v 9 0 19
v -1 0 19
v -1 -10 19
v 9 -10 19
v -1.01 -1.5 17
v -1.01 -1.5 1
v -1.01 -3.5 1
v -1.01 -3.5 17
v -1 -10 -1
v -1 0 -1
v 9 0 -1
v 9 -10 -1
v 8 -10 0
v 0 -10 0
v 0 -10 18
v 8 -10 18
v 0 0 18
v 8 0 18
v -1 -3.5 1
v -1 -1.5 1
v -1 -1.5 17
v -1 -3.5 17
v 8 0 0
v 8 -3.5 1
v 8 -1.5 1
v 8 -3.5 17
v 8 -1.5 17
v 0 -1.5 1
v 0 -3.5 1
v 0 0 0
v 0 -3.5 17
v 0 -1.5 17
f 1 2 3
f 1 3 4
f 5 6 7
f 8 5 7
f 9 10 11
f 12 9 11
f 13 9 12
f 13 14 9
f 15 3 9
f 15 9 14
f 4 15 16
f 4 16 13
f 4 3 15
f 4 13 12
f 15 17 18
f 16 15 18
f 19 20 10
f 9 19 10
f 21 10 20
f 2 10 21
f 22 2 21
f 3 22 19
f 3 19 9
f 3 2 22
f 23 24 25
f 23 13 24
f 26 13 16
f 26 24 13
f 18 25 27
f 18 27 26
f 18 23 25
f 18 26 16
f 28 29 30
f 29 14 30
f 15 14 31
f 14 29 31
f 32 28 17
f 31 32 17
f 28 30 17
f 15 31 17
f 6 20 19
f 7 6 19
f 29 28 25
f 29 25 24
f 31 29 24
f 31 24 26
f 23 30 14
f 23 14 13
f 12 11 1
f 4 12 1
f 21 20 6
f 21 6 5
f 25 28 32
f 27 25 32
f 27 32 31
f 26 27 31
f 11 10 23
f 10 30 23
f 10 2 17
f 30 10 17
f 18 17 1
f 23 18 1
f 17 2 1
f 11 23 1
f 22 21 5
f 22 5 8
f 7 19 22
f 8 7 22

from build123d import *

# Parameters (mm, degrees)
F0_W          = 10
F0_H          = 20
F0_W_2        = 8
F0_H_2        = 18
F1_DEPTH      = 10
F2_W          = 2
F2_H          = 16
F3_DEPTH      = 10
F3_DEPTH_BACK = 0.01


with BuildPart() as f1:
    # F0 (on Front) → F1 (new body)
    with BuildSketch(Plane.XZ):
        with Locations((4, 9)):
            Rectangle(F0_W, F0_H)
        with Locations((4, 9)):
            Rectangle(F0_W_2, F0_H_2, mode=Mode.SUBTRACT)
    extrude(amount=F1_DEPTH)

    # F2 (on face) → F3 (join, two sides)
    with BuildSketch(Plane(origin=(-1, 0, 0), x_dir=(0, -1, 0), z_dir=(-1, 0, 0))) as f3_sk:
        with Locations((2.5, 9)):
            Rectangle(F2_W, F2_H)
    extrude(amount=-F3_DEPTH)
    extrude(f3_sk.sketch, amount=F3_DEPTH_BACK)


solid = f1.part
